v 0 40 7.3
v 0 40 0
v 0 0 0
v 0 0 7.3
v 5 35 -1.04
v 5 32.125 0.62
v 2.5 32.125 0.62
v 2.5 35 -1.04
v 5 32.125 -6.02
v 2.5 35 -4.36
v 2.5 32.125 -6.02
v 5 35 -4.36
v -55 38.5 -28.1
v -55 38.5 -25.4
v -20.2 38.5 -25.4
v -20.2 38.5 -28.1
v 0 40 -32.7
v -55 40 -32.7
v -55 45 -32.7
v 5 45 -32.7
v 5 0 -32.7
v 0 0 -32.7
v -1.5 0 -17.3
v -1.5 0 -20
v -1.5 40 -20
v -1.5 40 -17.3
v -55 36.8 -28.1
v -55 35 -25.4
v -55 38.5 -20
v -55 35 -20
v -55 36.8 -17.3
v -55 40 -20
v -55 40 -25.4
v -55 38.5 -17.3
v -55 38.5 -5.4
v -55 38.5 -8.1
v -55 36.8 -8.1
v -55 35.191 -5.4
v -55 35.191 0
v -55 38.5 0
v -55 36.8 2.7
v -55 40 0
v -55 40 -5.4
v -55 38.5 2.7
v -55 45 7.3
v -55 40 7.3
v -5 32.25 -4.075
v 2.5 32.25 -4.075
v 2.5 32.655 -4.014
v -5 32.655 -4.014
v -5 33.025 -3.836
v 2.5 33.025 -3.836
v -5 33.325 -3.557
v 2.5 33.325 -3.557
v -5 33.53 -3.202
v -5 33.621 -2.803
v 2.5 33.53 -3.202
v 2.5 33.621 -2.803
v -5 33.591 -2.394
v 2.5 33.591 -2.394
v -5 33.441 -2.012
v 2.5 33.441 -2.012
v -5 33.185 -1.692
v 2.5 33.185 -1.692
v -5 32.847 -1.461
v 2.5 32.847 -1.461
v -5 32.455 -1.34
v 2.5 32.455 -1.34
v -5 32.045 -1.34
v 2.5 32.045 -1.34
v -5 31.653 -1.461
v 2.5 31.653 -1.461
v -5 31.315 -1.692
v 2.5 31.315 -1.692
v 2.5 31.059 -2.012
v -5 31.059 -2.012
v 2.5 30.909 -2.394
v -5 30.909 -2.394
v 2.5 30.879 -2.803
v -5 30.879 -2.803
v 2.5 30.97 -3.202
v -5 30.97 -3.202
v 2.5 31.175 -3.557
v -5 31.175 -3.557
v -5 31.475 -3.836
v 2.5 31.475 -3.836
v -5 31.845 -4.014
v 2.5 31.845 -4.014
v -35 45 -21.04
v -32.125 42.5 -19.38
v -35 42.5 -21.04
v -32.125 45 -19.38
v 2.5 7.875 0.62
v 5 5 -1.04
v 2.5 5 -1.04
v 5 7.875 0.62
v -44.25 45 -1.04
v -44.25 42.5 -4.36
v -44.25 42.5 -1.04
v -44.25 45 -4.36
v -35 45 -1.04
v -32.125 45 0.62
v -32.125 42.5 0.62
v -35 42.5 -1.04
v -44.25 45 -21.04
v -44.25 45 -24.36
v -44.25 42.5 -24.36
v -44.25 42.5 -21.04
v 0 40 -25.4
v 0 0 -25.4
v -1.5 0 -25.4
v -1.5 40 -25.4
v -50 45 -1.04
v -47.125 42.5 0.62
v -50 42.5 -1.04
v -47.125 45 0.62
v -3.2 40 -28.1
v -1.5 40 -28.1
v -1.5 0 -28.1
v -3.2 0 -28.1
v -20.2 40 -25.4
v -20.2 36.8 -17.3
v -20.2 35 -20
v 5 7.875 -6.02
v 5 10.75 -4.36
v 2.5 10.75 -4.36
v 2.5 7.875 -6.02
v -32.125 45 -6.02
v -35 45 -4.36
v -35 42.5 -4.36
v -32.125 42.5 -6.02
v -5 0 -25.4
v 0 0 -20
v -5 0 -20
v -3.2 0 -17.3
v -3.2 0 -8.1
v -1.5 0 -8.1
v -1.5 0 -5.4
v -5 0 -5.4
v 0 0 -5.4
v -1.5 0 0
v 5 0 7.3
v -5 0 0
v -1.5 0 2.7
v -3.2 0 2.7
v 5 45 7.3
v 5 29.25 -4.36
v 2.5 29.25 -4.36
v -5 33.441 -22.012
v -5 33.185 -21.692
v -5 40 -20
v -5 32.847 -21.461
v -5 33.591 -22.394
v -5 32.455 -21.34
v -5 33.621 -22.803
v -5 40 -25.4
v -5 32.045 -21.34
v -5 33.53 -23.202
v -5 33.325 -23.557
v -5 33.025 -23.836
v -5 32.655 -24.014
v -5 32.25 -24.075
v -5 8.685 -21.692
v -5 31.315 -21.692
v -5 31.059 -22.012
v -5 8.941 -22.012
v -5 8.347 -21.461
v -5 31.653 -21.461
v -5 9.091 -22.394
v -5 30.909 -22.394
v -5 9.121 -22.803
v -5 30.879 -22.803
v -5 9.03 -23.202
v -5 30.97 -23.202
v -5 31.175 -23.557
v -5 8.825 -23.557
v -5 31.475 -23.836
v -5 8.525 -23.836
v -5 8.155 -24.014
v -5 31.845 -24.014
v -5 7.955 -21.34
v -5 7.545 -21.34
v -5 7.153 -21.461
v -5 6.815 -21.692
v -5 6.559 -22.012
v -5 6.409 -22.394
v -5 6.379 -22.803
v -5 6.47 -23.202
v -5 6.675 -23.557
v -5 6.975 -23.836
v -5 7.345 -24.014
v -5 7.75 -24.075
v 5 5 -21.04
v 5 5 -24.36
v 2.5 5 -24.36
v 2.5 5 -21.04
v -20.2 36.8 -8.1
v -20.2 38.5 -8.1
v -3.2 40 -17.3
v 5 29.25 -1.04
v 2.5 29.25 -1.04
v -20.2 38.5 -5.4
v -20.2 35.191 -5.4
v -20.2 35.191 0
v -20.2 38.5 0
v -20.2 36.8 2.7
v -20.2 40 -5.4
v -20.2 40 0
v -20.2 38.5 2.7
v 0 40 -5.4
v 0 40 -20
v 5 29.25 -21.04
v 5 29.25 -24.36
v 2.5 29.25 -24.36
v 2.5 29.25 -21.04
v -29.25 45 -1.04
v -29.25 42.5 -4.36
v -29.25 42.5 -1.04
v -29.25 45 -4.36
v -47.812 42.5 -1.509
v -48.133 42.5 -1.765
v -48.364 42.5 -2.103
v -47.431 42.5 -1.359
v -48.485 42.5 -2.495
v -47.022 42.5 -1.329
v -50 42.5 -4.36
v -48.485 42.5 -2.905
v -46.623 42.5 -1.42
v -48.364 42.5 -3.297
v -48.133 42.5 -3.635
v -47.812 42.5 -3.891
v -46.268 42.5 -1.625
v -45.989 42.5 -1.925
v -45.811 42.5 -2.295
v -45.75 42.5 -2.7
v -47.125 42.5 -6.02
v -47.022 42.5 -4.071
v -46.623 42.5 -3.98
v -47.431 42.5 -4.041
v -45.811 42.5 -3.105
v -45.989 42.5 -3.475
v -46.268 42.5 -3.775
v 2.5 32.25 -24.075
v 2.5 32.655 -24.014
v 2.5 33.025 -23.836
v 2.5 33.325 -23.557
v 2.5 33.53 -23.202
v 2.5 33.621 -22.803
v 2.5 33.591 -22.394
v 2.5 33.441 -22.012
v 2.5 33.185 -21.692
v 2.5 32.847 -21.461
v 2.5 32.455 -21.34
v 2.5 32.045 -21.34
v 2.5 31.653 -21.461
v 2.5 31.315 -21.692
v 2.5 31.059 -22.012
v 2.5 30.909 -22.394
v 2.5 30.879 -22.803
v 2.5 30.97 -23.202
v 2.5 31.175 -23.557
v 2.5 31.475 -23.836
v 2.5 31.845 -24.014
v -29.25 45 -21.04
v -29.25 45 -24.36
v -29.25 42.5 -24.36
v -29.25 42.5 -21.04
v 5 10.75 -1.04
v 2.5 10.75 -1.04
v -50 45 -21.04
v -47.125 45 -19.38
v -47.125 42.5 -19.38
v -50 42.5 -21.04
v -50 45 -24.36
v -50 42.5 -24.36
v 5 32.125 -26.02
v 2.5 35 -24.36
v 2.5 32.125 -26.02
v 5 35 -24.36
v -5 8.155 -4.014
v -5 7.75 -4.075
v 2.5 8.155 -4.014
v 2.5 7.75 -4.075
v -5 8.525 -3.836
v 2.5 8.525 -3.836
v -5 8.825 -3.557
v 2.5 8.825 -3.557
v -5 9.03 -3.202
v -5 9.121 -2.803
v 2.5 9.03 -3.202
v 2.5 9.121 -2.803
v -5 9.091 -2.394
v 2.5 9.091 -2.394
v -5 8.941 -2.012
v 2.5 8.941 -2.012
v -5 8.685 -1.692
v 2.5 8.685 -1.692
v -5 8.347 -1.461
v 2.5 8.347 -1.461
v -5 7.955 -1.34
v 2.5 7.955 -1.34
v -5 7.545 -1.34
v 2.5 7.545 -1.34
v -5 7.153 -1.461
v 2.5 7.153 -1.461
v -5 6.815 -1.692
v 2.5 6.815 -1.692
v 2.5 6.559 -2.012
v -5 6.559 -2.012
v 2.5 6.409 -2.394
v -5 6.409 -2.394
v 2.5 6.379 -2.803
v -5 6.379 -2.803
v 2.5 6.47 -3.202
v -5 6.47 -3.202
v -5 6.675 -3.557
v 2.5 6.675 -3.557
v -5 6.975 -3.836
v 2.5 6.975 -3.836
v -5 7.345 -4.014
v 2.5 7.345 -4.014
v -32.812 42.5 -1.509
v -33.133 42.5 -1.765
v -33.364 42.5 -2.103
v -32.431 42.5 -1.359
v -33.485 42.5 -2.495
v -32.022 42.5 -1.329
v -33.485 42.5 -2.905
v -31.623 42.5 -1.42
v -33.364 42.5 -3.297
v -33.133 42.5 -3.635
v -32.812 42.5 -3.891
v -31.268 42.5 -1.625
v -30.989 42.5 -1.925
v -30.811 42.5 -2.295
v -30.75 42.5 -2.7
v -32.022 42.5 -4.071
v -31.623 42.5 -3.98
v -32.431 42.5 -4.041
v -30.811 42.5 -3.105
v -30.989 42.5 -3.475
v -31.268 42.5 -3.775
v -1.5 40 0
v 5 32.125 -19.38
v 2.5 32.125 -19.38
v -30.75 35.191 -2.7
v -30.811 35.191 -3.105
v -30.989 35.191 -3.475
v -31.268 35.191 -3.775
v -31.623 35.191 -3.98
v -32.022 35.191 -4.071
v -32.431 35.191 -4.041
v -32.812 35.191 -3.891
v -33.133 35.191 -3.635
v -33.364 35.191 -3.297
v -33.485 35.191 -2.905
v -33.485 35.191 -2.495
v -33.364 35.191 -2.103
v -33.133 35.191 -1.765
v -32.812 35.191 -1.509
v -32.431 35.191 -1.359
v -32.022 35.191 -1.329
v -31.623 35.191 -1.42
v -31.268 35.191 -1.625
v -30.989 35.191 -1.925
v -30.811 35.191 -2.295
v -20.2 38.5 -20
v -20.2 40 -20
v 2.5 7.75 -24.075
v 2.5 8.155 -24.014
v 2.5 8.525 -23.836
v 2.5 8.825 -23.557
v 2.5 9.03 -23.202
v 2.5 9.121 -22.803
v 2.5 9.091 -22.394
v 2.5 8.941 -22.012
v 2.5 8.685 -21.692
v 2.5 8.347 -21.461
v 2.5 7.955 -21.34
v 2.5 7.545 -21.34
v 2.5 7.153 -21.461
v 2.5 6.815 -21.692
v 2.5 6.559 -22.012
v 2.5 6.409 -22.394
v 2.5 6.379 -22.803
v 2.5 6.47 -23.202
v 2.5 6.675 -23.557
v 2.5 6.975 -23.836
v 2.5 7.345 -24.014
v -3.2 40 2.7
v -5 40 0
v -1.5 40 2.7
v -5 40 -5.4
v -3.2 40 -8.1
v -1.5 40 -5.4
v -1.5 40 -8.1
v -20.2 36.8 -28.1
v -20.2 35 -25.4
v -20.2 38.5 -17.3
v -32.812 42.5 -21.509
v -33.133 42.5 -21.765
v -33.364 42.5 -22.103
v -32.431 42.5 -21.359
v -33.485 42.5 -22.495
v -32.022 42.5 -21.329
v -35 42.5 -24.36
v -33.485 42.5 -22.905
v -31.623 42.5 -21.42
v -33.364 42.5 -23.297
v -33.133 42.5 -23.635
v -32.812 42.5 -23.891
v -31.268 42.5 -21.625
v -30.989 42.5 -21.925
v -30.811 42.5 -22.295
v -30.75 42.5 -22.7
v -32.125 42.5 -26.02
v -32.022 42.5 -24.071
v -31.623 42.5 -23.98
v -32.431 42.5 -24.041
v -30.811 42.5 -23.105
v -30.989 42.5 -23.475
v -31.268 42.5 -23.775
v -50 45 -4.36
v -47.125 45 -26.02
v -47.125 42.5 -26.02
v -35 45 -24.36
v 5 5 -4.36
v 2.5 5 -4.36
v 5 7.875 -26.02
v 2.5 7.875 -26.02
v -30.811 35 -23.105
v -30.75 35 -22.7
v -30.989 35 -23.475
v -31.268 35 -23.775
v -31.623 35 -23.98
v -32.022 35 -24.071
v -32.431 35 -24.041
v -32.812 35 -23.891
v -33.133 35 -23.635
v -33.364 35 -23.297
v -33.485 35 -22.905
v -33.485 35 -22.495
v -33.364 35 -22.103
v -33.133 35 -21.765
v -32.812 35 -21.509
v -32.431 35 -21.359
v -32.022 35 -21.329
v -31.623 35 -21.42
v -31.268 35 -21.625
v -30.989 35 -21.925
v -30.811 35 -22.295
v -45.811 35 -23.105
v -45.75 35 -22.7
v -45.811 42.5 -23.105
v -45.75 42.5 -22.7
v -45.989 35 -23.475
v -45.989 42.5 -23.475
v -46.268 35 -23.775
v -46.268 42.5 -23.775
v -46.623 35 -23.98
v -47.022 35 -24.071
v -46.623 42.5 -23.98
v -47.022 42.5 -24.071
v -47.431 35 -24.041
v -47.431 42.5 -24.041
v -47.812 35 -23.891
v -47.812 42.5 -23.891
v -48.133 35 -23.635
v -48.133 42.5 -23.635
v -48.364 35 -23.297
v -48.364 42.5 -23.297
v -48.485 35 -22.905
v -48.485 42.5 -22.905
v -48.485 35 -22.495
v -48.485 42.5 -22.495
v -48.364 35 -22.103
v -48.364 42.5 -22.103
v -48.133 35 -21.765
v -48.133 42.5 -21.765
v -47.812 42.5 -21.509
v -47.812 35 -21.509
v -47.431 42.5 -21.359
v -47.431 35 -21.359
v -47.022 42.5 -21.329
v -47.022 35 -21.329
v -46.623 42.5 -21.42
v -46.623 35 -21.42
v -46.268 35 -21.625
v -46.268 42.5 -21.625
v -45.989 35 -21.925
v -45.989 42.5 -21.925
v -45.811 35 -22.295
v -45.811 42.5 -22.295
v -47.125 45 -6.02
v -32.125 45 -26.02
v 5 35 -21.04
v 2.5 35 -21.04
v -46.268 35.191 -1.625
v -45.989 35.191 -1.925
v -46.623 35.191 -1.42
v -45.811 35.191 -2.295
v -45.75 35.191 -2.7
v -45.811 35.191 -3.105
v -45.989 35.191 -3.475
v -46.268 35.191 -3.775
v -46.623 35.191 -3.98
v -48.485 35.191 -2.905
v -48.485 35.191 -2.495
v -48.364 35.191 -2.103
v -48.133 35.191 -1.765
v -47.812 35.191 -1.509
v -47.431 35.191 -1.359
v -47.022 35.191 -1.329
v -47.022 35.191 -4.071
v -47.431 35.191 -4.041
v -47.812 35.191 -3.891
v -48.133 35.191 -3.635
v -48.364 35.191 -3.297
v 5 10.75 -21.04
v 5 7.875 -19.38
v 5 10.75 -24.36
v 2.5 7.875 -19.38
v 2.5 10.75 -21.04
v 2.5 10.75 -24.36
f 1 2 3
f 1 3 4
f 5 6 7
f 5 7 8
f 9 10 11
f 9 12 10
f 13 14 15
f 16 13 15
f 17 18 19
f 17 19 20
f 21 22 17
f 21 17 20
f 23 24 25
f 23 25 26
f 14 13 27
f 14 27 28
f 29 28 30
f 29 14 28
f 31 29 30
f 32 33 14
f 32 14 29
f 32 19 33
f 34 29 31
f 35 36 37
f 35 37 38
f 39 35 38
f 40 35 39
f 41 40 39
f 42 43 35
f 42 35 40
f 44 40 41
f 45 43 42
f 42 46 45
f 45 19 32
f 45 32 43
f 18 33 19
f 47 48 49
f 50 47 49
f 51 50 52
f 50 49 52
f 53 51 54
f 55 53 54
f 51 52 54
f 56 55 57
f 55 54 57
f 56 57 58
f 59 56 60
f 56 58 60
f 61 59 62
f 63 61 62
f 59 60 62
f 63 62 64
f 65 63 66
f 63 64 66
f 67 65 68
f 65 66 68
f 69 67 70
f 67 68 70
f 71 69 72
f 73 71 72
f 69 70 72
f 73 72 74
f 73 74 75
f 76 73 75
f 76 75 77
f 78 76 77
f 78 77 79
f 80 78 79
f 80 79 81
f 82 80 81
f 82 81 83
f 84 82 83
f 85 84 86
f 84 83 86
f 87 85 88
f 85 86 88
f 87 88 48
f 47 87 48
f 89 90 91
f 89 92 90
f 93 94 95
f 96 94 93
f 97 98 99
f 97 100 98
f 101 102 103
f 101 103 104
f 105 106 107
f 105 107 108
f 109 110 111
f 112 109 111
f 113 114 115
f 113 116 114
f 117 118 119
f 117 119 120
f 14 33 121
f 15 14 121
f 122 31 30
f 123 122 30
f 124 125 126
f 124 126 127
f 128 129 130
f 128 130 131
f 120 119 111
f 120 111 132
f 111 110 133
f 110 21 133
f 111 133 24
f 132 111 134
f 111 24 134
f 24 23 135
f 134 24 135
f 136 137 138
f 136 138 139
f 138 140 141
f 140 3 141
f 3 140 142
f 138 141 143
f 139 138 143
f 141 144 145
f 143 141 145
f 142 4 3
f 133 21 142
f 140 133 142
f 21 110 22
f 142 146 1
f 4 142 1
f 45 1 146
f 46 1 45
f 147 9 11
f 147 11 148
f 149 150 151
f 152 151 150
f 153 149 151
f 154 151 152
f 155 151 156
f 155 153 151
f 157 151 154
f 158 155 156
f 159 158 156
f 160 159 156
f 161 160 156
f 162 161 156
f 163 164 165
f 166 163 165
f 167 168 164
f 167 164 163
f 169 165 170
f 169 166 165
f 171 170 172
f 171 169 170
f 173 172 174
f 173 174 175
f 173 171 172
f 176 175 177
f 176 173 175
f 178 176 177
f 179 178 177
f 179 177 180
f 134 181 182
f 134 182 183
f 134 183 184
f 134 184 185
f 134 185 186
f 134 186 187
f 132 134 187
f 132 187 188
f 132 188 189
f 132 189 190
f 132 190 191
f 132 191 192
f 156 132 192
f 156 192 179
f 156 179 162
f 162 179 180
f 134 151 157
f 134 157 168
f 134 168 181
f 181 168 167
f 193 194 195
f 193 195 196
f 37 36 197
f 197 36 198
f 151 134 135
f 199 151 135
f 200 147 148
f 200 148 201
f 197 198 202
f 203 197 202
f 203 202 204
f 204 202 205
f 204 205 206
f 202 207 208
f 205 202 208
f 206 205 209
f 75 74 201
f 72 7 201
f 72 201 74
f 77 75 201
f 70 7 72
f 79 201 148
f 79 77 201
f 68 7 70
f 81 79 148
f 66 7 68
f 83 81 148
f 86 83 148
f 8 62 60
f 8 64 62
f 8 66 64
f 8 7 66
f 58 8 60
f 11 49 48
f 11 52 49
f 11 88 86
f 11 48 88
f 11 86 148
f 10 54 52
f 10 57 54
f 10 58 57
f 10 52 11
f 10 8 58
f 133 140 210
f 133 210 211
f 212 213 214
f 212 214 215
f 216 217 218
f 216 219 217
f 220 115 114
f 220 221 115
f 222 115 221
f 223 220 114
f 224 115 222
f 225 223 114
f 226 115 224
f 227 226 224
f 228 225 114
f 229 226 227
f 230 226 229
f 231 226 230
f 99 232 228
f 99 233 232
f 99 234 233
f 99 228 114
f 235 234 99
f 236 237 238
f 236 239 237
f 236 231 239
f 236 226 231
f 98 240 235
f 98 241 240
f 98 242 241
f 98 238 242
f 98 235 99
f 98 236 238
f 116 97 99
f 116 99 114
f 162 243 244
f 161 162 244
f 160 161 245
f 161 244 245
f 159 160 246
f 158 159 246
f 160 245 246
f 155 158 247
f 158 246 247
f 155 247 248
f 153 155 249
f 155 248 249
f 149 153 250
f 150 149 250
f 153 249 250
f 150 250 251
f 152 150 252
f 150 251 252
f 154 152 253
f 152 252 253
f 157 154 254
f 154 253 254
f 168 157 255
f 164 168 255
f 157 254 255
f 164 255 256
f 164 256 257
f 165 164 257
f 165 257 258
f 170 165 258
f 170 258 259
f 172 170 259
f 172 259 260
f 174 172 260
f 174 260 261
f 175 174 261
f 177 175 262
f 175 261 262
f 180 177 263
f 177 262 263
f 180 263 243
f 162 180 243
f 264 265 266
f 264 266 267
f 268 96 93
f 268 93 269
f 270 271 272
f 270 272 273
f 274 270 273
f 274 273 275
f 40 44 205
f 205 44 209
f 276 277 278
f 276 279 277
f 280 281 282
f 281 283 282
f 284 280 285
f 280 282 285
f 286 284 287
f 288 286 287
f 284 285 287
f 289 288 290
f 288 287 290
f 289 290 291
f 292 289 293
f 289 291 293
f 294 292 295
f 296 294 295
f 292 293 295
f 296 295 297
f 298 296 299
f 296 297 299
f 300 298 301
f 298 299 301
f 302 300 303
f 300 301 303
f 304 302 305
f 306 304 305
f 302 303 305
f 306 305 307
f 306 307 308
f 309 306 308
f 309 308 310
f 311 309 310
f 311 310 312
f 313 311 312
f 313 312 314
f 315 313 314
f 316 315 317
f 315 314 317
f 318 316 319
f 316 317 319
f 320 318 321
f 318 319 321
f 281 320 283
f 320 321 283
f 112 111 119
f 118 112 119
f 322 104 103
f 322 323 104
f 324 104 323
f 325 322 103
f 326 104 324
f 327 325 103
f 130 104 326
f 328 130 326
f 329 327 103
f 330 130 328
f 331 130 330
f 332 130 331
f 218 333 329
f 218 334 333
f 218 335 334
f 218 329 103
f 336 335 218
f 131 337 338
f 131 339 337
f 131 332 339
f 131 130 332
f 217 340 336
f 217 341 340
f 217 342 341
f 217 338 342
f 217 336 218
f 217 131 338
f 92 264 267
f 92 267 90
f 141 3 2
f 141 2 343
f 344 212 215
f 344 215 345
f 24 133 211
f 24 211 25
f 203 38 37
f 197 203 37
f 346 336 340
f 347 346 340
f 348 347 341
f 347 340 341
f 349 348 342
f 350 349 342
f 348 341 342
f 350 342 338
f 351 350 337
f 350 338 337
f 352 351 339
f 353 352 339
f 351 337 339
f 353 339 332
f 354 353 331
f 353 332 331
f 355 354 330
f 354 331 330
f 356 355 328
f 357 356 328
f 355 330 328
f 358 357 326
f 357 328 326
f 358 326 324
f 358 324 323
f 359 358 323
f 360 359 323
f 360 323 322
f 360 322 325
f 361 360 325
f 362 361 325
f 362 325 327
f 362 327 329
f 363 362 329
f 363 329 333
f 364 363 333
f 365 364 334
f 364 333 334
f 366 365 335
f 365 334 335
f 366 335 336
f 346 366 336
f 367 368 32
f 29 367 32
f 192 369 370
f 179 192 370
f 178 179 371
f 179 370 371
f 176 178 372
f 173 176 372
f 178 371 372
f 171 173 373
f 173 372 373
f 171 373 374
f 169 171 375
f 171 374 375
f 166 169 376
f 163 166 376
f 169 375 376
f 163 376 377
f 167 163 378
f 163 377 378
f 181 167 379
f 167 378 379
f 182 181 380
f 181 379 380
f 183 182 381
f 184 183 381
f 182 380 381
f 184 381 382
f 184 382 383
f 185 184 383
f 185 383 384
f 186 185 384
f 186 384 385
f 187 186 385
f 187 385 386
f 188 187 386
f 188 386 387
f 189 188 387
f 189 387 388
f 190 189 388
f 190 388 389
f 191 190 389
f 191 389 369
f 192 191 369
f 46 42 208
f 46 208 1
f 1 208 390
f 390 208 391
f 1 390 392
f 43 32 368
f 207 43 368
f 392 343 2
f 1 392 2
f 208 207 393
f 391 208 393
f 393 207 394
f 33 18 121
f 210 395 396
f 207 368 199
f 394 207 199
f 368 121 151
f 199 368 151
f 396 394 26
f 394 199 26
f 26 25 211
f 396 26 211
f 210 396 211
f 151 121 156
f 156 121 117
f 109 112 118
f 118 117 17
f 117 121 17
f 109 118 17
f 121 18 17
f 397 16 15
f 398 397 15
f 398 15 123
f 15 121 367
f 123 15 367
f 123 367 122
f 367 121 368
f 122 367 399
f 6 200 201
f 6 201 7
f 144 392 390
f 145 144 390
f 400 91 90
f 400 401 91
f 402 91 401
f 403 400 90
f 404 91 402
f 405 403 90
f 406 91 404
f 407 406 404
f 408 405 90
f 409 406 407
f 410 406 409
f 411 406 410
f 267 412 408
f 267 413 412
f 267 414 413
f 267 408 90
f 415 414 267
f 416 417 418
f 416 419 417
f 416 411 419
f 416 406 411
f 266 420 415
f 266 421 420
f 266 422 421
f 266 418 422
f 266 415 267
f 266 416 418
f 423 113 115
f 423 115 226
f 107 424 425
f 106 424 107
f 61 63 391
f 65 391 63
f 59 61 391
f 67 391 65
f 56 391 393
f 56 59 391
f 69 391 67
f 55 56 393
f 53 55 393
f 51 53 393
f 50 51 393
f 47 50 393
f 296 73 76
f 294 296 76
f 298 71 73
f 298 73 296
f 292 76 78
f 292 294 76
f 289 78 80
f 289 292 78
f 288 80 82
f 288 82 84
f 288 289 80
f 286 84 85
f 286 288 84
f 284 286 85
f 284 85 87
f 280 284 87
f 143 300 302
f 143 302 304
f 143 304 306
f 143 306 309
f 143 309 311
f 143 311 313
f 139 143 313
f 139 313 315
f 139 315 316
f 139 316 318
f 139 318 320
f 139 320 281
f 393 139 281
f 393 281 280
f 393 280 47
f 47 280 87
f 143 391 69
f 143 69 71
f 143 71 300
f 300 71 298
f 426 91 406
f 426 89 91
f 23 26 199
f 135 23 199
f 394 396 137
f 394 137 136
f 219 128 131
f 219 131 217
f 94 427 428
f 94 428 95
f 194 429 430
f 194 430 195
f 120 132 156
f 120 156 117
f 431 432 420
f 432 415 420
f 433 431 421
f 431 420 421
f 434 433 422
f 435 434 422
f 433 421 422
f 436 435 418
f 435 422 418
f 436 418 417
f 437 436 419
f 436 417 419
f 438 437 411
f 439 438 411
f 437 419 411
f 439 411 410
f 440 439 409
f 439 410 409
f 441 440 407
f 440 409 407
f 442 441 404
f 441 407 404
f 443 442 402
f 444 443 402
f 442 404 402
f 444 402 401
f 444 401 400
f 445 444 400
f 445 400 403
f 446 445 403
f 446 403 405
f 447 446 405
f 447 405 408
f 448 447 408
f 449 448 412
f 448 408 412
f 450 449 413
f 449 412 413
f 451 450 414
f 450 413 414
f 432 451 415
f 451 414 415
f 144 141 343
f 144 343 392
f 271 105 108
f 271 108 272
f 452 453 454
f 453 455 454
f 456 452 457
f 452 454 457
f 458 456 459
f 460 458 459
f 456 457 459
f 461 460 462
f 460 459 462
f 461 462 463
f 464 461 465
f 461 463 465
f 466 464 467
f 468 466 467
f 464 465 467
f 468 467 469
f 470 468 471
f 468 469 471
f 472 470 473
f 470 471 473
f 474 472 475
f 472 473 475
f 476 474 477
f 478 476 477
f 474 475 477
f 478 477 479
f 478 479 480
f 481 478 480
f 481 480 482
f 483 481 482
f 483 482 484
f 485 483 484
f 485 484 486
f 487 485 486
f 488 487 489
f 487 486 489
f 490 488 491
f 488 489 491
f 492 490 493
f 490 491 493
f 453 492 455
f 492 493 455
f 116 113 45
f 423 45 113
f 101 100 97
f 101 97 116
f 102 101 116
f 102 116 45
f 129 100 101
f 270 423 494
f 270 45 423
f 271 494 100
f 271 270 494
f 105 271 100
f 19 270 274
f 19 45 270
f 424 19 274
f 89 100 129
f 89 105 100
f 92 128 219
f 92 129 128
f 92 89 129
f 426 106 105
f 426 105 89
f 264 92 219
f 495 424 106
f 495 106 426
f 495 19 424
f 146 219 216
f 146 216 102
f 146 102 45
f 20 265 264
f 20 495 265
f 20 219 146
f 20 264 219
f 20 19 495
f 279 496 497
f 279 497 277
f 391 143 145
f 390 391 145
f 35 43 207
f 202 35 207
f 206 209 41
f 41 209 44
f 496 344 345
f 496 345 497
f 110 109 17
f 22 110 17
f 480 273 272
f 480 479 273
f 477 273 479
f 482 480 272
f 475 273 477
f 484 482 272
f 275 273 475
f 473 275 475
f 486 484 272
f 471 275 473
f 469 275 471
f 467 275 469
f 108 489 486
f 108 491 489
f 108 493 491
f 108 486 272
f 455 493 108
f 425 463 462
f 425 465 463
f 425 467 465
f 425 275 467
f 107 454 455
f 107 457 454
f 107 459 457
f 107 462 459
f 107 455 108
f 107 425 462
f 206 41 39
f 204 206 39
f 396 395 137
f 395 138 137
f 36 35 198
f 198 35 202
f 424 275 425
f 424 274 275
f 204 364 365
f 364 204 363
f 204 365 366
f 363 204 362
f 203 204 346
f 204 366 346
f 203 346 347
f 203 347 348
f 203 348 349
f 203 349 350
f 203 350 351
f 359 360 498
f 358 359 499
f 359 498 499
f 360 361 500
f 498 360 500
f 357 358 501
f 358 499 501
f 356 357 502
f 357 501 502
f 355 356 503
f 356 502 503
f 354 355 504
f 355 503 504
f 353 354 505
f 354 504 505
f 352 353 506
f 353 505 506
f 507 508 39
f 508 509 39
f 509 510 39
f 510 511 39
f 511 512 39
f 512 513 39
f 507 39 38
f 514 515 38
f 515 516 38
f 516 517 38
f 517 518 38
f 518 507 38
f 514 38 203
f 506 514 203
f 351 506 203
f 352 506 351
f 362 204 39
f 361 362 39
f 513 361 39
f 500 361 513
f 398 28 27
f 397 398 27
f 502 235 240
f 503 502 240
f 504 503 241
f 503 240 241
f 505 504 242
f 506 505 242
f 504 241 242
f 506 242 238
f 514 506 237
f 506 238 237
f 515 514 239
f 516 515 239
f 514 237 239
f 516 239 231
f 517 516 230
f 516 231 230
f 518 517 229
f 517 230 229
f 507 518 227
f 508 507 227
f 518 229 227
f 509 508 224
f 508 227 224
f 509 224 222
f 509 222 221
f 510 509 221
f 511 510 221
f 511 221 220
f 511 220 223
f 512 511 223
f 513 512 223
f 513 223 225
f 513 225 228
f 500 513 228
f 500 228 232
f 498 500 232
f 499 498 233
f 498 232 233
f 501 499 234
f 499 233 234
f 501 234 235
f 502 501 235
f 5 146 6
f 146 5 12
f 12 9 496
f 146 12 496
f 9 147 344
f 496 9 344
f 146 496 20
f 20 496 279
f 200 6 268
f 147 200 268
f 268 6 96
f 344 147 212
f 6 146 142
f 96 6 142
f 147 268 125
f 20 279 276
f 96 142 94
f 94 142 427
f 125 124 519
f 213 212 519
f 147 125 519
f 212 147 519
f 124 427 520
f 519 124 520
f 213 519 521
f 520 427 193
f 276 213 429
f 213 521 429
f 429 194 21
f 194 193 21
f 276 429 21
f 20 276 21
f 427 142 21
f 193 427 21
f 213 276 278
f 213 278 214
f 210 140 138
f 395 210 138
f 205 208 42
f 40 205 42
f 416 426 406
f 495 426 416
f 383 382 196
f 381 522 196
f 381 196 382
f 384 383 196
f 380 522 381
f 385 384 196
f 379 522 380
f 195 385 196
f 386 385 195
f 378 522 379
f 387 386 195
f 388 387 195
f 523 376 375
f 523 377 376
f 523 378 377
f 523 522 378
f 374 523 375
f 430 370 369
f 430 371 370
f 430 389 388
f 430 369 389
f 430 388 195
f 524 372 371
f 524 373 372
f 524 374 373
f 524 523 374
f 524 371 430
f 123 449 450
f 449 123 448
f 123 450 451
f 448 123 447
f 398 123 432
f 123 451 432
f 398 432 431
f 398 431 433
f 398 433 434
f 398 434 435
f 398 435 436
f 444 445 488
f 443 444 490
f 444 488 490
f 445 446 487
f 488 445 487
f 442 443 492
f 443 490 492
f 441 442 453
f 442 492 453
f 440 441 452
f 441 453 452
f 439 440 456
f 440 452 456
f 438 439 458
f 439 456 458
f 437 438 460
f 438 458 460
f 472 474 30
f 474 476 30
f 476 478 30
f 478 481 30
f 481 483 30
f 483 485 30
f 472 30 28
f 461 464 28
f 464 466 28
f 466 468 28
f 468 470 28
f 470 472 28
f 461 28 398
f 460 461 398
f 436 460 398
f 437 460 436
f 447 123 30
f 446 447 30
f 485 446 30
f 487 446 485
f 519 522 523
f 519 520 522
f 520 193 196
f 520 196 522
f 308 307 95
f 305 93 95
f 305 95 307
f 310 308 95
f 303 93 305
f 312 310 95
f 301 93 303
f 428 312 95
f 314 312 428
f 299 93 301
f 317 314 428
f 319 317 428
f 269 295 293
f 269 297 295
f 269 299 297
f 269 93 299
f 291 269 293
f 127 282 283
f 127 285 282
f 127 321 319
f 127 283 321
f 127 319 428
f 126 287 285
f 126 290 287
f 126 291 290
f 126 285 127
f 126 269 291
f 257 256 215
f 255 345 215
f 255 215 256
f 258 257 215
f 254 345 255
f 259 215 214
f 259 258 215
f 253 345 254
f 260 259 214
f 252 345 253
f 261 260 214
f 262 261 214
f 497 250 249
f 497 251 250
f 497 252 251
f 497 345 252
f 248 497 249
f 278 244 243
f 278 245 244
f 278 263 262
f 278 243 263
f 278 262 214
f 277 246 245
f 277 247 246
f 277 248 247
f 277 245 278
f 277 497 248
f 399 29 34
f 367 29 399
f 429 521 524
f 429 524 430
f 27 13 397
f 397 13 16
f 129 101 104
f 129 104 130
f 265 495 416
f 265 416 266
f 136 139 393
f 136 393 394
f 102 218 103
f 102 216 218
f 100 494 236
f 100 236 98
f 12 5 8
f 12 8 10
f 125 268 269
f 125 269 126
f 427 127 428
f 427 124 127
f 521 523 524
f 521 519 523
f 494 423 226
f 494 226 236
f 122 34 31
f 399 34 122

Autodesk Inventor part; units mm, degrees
ref_plane "YZ Plane" through (0, 0, 0) normal (1, 0, 0) x (0, 1, 0)
ref_plane "XZ Plane" through (0, 0, 0) normal (0, 1, 0) x (-1, 0, 0)
ref_plane "XY Plane" through (0, 0, 0) normal (0, 0, 1) x (1, 0, 0)
sketch "Sketch1" plane through (0, 0, 0) normal (0, 1, 0) x (-1, 0, 0)
  line L0 (0, -5.4) -> (1.5, -5.4)
  line L1 (1.5, -5.4) -> (1.5, -8.1)
  line L2 (1.5, -8.1) -> (3.2, -8.1)
  line L3 (0, 0) -> (1.5, 0)
  line L4 (1.5, 0) -> (1.5, 2.7)
  line L5 (1.5, 2.7) -> (3.2, 2.7)
  line L6 (5, 0) -> (5, -5.4)
  line L7 (5, -5.4) -> (3.2, -8.1)
  line L8 (5, 0) -> (3.2, 2.7)
  line L9 (0, -20) -> (1.5, -20)
  line L10 (1.5, -20) -> (1.5, -17.3)
  line L11 (1.5, -17.3) -> (3.2, -17.3)
  line L12 (0, -25.4) -> (1.5, -25.4)
  line L13 (1.5, -25.4) -> (1.5, -28.1)
  line L14 (1.5, -28.1) -> (3.2, -28.1)
  line L15 (5, -20) -> (5, -25.4)
  line L16 (5, -25.4) -> (3.2, -28.1)
  line L17 (5, -20) -> (3.2, -17.3)
  line L18 (0, -5.4) -> (0, -20)
  line L19 (0, 0) -> (0, 7.3)
  line L20 (0, 7.3) -> (-5, 7.3)
  line L21 (0, -25.4) -> (0, -32.7)
  line L22 (0, -32.7) -> (-5, -32.7)
  line L23 (-5, -32.7) -> (-5, 7.3)
  dimension "d0" = 5.4
  dimension "d1" = 1.5
  dimension "d2" = 2.7
  dimension "d3" = 1.7
  dimension "d4" = 2.7
  dimension "d5" = 1.7
  dimension "d9" = 2.7
  dimension "d10" = 2.7
  dimension "d11" = 5.4
  dimension "d12" = 7.3
  dimension "d13" = 5
  dimension "d14" = 7.3
  dimension "d15" = 5
  dimension "d16" = 20
extrude "Extrusion1" add sketch "Sketch1" along normal blind 40
sketch "Sketch2" plane through (5, 0, 7.3) normal (1, 0, 0) x (0, 0, -1)
  line L0 (11.6599, 5) -> (8.3401, 5)
  line L1 (8.3401, 5) -> (6.6802, 7.875)
  line L2 (6.6802, 7.875) -> (8.3401, 10.75)
  line L3 (8.3401, 10.75) -> (11.6599, 10.75)
  line L4 (11.6599, 10.75) -> (13.3198, 7.875)
  line L5 (13.3198, 7.875) -> (11.6599, 5)
  line L6 (40, 0) -> (0, 0) projected
  line L7 (0, 0) -> (0, 40) projected
  line L8 (31.6599, 5) -> (28.3401, 5)
  line L9 (28.3401, 5) -> (26.6802, 7.875)
  line L10 (26.6802, 7.875) -> (28.3401, 10.75)
  line L11 (28.3401, 10.75) -> (31.6599, 10.75)
  line L12 (31.6599, 10.75) -> (33.3198, 7.875)
  line L13 (33.3198, 7.875) -> (31.6599, 5)
  line L14 (40, 0) -> (40, 40) projected
  line L15 (11.6599, 29.25) -> (8.3401, 29.25)
  line L16 (8.3401, 29.25) -> (6.6802, 32.125)
  line L17 (6.6802, 32.125) -> (8.3401, 35)
  line L18 (8.3401, 35) -> (11.6599, 35)
  line L19 (11.6599, 35) -> (13.3198, 32.125)
  line L20 (13.3198, 32.125) -> (11.6599, 29.25)
  line L21 (31.6599, 29.25) -> (28.3401, 29.25)
  line L22 (28.3401, 29.25) -> (26.6802, 32.125)
  line L23 (26.6802, 32.125) -> (28.3401, 35)
  line L24 (28.3401, 35) -> (31.6599, 35)
  line L25 (31.6599, 35) -> (33.3198, 32.125)
  line L26 (33.3198, 32.125) -> (31.6599, 29.25)
  line L27 (0, 40) -> (40, 40) projected
  point P0 (7.3, 0)
  point P1 (10, 7.875)
  point P2 (30, 7.875)
  point P3 (10, 32.125)
  point P4 (30, 32.125)
  dimension "d17" = 5.75
  dimension "d18" = 5
  dimension "d19" = 10
  dimension "d20" = 5.75
  dimension "d21" = 5
  dimension "d22" = 10
  dimension "d23" = 5.75
  dimension "d24" = 5.75
  dimension "d25" = 5
  dimension "d26" = 5
  dimension "d27" = 10
  dimension "d28" = 10
extrude "Extrusion2" cut sketch "Sketch2" against normal blind 2.5 contours L0 L1 L2 L3 L4 L5 | L8 L9 L10 L11 L12 L13 | L15 L16 L17 L18 L19 L20 | L21 L22 L23 L24 L25 L26
sketch "Sketch3" plane through (2.5, 0, 7.3) normal (1, 0, 0) x (0, 0, -1)
  circle A0 centre (30, 7.75) radius 1.375
  circle A1 centre (10, 7.75) radius 1.375
  circle A2 centre (10, 32.25) radius 1.375
  circle A3 centre (30, 32.25) radius 1.375
  point P0 (7.3, 0)
  dimension "d31" = 2.75
  dimension "d32" = 2.75
  dimension "d33" = 2.75
extrude "Extrusion3" cut sketch "Sketch3" against normal blind 20
sketch "Sketch4" plane through (0, 40, 0) normal (0, 1, 0) x (1, 0, 0)
  line L0 (5, -7.3) -> (5, 32.7) projected
  line L1 (5, -7.3) -> (-55, -7.3)
  line L2 (-55, -7.3) -> (-55, 32.7)
  line L3 (-55, 32.7) -> (5, 32.7)
  line L4 (5, 32.7) -> (5, -7.3)
  point P0 (0, 0)
  dimension "d36" = 60
extrude "Extrusion4" add sketch "Sketch4" along normal blind 5
sketch "Sketch5" plane through (0, 40, 0) normal (0, -1, 0) x (1, 0, 0)
  line L0 (-55, -32.7) -> (-55, 7.3) projected
  line L1 (-20.2, 0) -> (-55, 0)
  line L2 (-55, 0) -> (-55, -5.4)
  line L3 (-55, -5.4) -> (-20.2, -5.4)
  line L4 (-20.2, -5.4) -> (-20.2, 0)
  line L5 (0, -5.4) -> (0, -20) projected
  line L6 (-20.2, -20) -> (-55, -20)
  line L7 (-55, -20) -> (-55, -25.4)
  line L8 (-55, -25.4) -> (-20.2, -25.4)
  line L9 (-20.2, -25.4) -> (-20.2, -20)
  point P0 (0, 0)
  dimension "d39" = 5.4
  dimension "d40" = 20.2
  dimension "d41" = 5.4
extrude "Extrusion5" add sketch "Sketch5" along normal blind 1.5
sketch "Sketch6" plane through (-55, 40, 7.3) normal (-1, 0, 0) x (0, 0, 1)
  point P0 (-7.3, -40)
sketch "Sketch7" plane through (-55, 40, 7.3) normal (-1, 0, 0) x (0, 0, 1)
  point P0 (-7.3, -40)
sketch "Sketch8" plane through (0, 38.5, 0) normal (0, -1, 0) x (1, 0, 0)
  line L0 (-55, -32.7) -> (-55, 7.3) projected
  line L1 (-20.2, 2.7) -> (-55, 2.7)
  line L2 (-55, 2.7) -> (-55, -8.1)
  line L3 (-55, -8.1) -> (-20.2, -8.1)
  line L4 (-20.2, -8.1) -> (-20.2, 2.7)
  line L5 (-20.2, -17.3) -> (-55, -17.3)
  line L6 (-55, -17.3) -> (-55, -28.1)
  line L7 (-55, -28.1) -> (-20.2, -28.1)
  line L8 (-20.2, -28.1) -> (-20.2, -17.3)
  line L9 (-20.2, -20) -> (-55, -20) projected
  point P0 (0, 0)
  dimension "d44" = 10.8
  dimension "d45" = 10.8
  dimension "d46" = 2.7
extrude "Extrusion6" add sketch "Sketch8" along normal blind 1.7 contours L0 L1 L4 L3 | L0 L9 L8 L7
sketch "Sketch9" plane through (-55, 40, 7.3) normal (-1, 0, 0) x (0, 0, 1)
  line L0 (-7.3, -4.809) -> (-12.7, -4.809)
  line L1 (-12.7, -40) -> (-12.7, 0) projected
  line L2 (-4.6, -3.2) -> (-15.4, -3.2) projected
  line L3 (-12.7, -4.809) -> (-15.4, -3.2)
  line L4 (-15.4, -3.2) -> (-4.6, -3.2)
  line L5 (-4.6, -3.2) -> (-7.3, -4.809)
  point P0 (-7.3, -40)
  dimension "d49" = 5.4
extrude "Extrusion7" add sketch "Sketch9" against normal blind 34.8
sketch "Sketch10" plane through (-55, 40, -20) normal (0, 0, 1) x (1, 0, 0)
  line L0 (34.8, -3.2) -> (0, -3.2) projected
  line L1 (0, 0) -> (0, -3.2) projected
  line L2 (34.8, -3.2) -> (0, -3.2)
  line L3 (0, -3.2) -> (0, -1.5)
  line L4 (0, -1.5) -> (34.8, -1.5)
  line L5 (34.8, -1.5) -> (34.8, -3.2)
  point P0 (55, -40)
  dimension "d52" = 1.7
extrude "Extrusion8" add sketch "Sketch10" along normal blind 2.7
sketch "Sketch11" plane through (-55, 40, 7.3) normal (-1, 0, 0) x (0, 0, 1)
  line L0 (-24.6, -3.2) -> (-24.6, -1.5) projected
  line L1 (-35.4, -3.2) -> (-24.6, -3.2) projected
  line L2 (-24.6, -3.2) -> (-35.4, -3.2)
  line L3 (-27.3, -5) -> (-32.7, -5)
  line L4 (-32.7, -5) -> (-35.4, -3.2)
  line L5 (-24.6, -3.2) -> (-27.3, -5)
  line L6 (-27.3, 0) -> (-32.7, 0) projected
  point P0 (-7.3, -40)
  dimension "d55" = 5.4
  dimension "d56" = 5
extrude "Extrusion9" add sketch "Sketch11" against normal blind 34.8
sketch "Sketch12" plane through (0, 45, 0) normal (0, 1, 0) x (1, 0, 0)
  line L0 (-44.25, 4.3599) -> (-44.25, 1.0401)
  line L1 (-44.25, 1.0401) -> (-47.125, -0.6198)
  line L2 (-47.125, -0.6198) -> (-50, 1.0401)
  line L3 (-50, 1.0401) -> (-50, 4.3599)
  line L4 (-50, 4.3599) -> (-47.125, 6.0198)
  line L5 (-47.125, 6.0198) -> (-44.25, 4.3599)
  line L6 (-44.25, 24.3599) -> (-44.25, 21.0401)
  line L7 (-44.25, 21.0401) -> (-47.125, 19.3802)
  line L8 (-47.125, 19.3802) -> (-50, 21.0401)
  line L9 (-50, 21.0401) -> (-50, 24.3599)
  line L10 (-50, 24.3599) -> (-47.125, 26.0198)
  line L11 (-47.125, 26.0198) -> (-44.25, 24.3599)
  line L12 (-55, 25.4) -> (-20.2, 25.4) projected
  line L13 (-29.25, 4.3599) -> (-29.25, 1.0401)
  line L14 (-29.25, 1.0401) -> (-32.125, -0.6198)
  line L15 (-32.125, -0.6198) -> (-35, 1.0401)
  line L16 (-35, 1.0401) -> (-35, 4.3599)
  line L17 (-35, 4.3599) -> (-32.125, 6.0198)
  line L18 (-32.125, 6.0198) -> (-29.25, 4.3599)
  line L19 (-55, 32.7) -> (-55, -7.3) projected
  line L20 (5, 32.7) -> (-55, 32.7) projected
  line L21 (-55, -7.3) -> (5, -7.3) projected
  line L22 (-29.25, 24.3599) -> (-29.25, 21.0401)
  line L23 (-29.25, 21.0401) -> (-32.125, 19.3802)
  line L24 (-32.125, 19.3802) -> (-35, 21.0401)
  line L25 (-35, 21.0401) -> (-35, 24.3599)
  line L26 (-35, 24.3599) -> (-32.125, 26.0198)
  line L27 (-32.125, 26.0198) -> (-29.25, 24.3599)
  point P0 (0, 0)
  point P1 (-47.125, 2.7)
  point P2 (-47.125, 22.7)
  point P3 (-32.125, 2.7)
  point P4 (-32.125, 22.7)
  dimension "d59" = 5.75
  dimension "d60" = 5.75
  dimension "d61" = 5.75
  dimension "d62" = 5
  dimension "d63" = 5
  dimension "d64" = 20
  dimension "d67" = 10
  dimension "d69" = 10
  dimension "d70" = 10
extrude "Extrusion10" cut sketch "Sketch12" against normal blind 2.5
sketch "Sketch13" plane through (0, 42.5, 0) normal (0, 1, 0) x (1, 0, 0)
  circle A0 centre (-47.125, 2.7) radius 1.375
  circle A1 centre (-32.125, 2.7) radius 1.375
  circle A2 centre (-47.125, 22.7) radius 1.375
  circle A3 centre (-32.125, 22.7) radius 1.375
  line L0 (-44.25, 4.3599) -> (-44.25, 1.0401) projected
  line L1 (-29.25, 4.3599) -> (-29.25, 1.0401) projected
  line L2 (-29.25, 24.3599) -> (-29.25, 21.0401) projected
  line L3 (-35, 24.3599) -> (-32.125, 26.0198) projected
  line L4 (-35, 4.3599) -> (-32.125, 6.0198) projected
  line L5 (-50, 4.3599) -> (-47.125, 6.0198) projected
  line L6 (-44.25, 24.3599) -> (-44.25, 21.0401) projected
  line L7 (-50, 24.3599) -> (-47.125, 26.0198) projected
  point P0 (0, 0)
  dimension "d73" = 2.75
  dimension "d74" = 2.75
  dimension "d75" = 2.75
  dimension "d76" = 2.75
  dimension "d77" = 2.875
  dimension "d78" = 2.875
  dimension "d79" = 2.875
  dimension "d80" = 2.875
  dimension "d81" = 2.875
  dimension "d82" = 2.875
  dimension "d83" = 2.875
  dimension "d84" = 2.875
extrude "Extrusion11" cut sketch "Sketch13" against normal blind 20
properties part number "slotmountingPlate_dualcorner_m3"
